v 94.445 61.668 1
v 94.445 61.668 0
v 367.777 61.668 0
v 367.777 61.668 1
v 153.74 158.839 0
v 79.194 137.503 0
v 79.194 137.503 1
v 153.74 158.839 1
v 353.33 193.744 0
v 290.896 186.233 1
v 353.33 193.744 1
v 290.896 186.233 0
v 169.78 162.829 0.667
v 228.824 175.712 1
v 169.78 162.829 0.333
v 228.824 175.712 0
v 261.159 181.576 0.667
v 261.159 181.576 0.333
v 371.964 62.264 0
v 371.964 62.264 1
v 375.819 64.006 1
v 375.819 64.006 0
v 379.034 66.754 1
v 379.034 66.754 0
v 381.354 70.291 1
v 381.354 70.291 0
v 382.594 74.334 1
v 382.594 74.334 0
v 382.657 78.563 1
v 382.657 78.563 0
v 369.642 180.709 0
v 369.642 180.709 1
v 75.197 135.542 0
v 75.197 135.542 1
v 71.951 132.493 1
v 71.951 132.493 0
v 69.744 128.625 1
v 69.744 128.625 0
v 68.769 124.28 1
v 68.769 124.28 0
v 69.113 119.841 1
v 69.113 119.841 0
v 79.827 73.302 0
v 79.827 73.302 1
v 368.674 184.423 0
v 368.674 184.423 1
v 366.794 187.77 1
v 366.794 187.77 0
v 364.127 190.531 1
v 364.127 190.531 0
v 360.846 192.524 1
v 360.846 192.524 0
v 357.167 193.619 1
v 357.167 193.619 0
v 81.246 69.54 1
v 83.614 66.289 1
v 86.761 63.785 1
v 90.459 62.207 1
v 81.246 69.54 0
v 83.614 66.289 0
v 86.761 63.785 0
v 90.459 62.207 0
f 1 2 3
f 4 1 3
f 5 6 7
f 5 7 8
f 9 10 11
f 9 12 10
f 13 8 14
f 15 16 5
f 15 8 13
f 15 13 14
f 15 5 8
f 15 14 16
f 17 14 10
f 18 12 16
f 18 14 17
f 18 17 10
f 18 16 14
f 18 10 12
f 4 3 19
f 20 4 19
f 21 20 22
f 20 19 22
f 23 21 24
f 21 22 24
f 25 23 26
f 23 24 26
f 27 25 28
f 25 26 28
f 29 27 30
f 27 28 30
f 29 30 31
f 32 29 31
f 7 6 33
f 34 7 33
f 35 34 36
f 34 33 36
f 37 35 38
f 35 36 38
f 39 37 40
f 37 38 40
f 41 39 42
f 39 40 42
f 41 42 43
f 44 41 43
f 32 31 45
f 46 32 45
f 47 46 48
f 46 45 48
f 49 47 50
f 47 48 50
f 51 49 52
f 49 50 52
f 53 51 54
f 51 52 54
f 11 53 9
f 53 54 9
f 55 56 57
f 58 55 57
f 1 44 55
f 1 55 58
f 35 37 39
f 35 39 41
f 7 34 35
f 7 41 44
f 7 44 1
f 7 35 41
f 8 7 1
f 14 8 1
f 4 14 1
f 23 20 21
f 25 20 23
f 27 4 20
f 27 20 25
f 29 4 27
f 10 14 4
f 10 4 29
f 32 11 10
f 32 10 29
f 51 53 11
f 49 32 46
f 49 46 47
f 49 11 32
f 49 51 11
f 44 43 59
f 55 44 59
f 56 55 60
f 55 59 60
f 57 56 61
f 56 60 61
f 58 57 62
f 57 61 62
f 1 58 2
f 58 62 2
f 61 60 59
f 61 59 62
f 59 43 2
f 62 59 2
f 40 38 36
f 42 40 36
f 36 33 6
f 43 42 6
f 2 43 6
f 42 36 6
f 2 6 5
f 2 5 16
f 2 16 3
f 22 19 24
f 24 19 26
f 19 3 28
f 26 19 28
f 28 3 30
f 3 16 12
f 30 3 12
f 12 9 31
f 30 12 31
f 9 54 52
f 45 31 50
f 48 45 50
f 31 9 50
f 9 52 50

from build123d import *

# Parameters (mm, degrees)
RESSALTO_EXTRUS_O1_DEPTH = 1


with BuildPart() as part:
    # Esboço1 → Ressalto-extrusão1 (new body)
    with BuildSketch(Plane.XY):
        with BuildLine():
            Line((94.444598391, 61.667599804), (367.776904696, 61.667599804))
            ThreePointArc((367.776904696, 61.667599804), (379.03385921, 66.75392364), (382.656611581, 78.563469793))
            Line((382.656611581, 78.563469793), (369.641986092, 180.708560753))
            ThreePointArc((369.641986092, 180.708560753), (364.126605538, 190.530599808), (353.330083137, 193.744161368))
            add(Edge.make_bspline(
                [(79.194488068, 137.503422788), (169.384224686, 166.11838017), (260.762756376, 184.86529303), (353.330083137, 193.744161368)],
                knots=[0.031642667, 0.031642667, 0.031642667, 0.031642667, 0.681355193, 0.681355193, 0.681355193, 0.681355193], degree=3))
            ThreePointArc((79.194488068, 137.503422788), (70.703408387, 130.641376571), (69.113130899, 119.840583547))
            Line((69.113130899, 119.840583547), (79.826960066, 73.302388103))
            ThreePointArc((79.826960066, 73.302388103), (85.103243444, 64.931370096), (94.444598391, 61.667599804))
        make_face()
    extrude(amount=RESSALTO_EXTRUS_O1_DEPTH)


solid = part.part
